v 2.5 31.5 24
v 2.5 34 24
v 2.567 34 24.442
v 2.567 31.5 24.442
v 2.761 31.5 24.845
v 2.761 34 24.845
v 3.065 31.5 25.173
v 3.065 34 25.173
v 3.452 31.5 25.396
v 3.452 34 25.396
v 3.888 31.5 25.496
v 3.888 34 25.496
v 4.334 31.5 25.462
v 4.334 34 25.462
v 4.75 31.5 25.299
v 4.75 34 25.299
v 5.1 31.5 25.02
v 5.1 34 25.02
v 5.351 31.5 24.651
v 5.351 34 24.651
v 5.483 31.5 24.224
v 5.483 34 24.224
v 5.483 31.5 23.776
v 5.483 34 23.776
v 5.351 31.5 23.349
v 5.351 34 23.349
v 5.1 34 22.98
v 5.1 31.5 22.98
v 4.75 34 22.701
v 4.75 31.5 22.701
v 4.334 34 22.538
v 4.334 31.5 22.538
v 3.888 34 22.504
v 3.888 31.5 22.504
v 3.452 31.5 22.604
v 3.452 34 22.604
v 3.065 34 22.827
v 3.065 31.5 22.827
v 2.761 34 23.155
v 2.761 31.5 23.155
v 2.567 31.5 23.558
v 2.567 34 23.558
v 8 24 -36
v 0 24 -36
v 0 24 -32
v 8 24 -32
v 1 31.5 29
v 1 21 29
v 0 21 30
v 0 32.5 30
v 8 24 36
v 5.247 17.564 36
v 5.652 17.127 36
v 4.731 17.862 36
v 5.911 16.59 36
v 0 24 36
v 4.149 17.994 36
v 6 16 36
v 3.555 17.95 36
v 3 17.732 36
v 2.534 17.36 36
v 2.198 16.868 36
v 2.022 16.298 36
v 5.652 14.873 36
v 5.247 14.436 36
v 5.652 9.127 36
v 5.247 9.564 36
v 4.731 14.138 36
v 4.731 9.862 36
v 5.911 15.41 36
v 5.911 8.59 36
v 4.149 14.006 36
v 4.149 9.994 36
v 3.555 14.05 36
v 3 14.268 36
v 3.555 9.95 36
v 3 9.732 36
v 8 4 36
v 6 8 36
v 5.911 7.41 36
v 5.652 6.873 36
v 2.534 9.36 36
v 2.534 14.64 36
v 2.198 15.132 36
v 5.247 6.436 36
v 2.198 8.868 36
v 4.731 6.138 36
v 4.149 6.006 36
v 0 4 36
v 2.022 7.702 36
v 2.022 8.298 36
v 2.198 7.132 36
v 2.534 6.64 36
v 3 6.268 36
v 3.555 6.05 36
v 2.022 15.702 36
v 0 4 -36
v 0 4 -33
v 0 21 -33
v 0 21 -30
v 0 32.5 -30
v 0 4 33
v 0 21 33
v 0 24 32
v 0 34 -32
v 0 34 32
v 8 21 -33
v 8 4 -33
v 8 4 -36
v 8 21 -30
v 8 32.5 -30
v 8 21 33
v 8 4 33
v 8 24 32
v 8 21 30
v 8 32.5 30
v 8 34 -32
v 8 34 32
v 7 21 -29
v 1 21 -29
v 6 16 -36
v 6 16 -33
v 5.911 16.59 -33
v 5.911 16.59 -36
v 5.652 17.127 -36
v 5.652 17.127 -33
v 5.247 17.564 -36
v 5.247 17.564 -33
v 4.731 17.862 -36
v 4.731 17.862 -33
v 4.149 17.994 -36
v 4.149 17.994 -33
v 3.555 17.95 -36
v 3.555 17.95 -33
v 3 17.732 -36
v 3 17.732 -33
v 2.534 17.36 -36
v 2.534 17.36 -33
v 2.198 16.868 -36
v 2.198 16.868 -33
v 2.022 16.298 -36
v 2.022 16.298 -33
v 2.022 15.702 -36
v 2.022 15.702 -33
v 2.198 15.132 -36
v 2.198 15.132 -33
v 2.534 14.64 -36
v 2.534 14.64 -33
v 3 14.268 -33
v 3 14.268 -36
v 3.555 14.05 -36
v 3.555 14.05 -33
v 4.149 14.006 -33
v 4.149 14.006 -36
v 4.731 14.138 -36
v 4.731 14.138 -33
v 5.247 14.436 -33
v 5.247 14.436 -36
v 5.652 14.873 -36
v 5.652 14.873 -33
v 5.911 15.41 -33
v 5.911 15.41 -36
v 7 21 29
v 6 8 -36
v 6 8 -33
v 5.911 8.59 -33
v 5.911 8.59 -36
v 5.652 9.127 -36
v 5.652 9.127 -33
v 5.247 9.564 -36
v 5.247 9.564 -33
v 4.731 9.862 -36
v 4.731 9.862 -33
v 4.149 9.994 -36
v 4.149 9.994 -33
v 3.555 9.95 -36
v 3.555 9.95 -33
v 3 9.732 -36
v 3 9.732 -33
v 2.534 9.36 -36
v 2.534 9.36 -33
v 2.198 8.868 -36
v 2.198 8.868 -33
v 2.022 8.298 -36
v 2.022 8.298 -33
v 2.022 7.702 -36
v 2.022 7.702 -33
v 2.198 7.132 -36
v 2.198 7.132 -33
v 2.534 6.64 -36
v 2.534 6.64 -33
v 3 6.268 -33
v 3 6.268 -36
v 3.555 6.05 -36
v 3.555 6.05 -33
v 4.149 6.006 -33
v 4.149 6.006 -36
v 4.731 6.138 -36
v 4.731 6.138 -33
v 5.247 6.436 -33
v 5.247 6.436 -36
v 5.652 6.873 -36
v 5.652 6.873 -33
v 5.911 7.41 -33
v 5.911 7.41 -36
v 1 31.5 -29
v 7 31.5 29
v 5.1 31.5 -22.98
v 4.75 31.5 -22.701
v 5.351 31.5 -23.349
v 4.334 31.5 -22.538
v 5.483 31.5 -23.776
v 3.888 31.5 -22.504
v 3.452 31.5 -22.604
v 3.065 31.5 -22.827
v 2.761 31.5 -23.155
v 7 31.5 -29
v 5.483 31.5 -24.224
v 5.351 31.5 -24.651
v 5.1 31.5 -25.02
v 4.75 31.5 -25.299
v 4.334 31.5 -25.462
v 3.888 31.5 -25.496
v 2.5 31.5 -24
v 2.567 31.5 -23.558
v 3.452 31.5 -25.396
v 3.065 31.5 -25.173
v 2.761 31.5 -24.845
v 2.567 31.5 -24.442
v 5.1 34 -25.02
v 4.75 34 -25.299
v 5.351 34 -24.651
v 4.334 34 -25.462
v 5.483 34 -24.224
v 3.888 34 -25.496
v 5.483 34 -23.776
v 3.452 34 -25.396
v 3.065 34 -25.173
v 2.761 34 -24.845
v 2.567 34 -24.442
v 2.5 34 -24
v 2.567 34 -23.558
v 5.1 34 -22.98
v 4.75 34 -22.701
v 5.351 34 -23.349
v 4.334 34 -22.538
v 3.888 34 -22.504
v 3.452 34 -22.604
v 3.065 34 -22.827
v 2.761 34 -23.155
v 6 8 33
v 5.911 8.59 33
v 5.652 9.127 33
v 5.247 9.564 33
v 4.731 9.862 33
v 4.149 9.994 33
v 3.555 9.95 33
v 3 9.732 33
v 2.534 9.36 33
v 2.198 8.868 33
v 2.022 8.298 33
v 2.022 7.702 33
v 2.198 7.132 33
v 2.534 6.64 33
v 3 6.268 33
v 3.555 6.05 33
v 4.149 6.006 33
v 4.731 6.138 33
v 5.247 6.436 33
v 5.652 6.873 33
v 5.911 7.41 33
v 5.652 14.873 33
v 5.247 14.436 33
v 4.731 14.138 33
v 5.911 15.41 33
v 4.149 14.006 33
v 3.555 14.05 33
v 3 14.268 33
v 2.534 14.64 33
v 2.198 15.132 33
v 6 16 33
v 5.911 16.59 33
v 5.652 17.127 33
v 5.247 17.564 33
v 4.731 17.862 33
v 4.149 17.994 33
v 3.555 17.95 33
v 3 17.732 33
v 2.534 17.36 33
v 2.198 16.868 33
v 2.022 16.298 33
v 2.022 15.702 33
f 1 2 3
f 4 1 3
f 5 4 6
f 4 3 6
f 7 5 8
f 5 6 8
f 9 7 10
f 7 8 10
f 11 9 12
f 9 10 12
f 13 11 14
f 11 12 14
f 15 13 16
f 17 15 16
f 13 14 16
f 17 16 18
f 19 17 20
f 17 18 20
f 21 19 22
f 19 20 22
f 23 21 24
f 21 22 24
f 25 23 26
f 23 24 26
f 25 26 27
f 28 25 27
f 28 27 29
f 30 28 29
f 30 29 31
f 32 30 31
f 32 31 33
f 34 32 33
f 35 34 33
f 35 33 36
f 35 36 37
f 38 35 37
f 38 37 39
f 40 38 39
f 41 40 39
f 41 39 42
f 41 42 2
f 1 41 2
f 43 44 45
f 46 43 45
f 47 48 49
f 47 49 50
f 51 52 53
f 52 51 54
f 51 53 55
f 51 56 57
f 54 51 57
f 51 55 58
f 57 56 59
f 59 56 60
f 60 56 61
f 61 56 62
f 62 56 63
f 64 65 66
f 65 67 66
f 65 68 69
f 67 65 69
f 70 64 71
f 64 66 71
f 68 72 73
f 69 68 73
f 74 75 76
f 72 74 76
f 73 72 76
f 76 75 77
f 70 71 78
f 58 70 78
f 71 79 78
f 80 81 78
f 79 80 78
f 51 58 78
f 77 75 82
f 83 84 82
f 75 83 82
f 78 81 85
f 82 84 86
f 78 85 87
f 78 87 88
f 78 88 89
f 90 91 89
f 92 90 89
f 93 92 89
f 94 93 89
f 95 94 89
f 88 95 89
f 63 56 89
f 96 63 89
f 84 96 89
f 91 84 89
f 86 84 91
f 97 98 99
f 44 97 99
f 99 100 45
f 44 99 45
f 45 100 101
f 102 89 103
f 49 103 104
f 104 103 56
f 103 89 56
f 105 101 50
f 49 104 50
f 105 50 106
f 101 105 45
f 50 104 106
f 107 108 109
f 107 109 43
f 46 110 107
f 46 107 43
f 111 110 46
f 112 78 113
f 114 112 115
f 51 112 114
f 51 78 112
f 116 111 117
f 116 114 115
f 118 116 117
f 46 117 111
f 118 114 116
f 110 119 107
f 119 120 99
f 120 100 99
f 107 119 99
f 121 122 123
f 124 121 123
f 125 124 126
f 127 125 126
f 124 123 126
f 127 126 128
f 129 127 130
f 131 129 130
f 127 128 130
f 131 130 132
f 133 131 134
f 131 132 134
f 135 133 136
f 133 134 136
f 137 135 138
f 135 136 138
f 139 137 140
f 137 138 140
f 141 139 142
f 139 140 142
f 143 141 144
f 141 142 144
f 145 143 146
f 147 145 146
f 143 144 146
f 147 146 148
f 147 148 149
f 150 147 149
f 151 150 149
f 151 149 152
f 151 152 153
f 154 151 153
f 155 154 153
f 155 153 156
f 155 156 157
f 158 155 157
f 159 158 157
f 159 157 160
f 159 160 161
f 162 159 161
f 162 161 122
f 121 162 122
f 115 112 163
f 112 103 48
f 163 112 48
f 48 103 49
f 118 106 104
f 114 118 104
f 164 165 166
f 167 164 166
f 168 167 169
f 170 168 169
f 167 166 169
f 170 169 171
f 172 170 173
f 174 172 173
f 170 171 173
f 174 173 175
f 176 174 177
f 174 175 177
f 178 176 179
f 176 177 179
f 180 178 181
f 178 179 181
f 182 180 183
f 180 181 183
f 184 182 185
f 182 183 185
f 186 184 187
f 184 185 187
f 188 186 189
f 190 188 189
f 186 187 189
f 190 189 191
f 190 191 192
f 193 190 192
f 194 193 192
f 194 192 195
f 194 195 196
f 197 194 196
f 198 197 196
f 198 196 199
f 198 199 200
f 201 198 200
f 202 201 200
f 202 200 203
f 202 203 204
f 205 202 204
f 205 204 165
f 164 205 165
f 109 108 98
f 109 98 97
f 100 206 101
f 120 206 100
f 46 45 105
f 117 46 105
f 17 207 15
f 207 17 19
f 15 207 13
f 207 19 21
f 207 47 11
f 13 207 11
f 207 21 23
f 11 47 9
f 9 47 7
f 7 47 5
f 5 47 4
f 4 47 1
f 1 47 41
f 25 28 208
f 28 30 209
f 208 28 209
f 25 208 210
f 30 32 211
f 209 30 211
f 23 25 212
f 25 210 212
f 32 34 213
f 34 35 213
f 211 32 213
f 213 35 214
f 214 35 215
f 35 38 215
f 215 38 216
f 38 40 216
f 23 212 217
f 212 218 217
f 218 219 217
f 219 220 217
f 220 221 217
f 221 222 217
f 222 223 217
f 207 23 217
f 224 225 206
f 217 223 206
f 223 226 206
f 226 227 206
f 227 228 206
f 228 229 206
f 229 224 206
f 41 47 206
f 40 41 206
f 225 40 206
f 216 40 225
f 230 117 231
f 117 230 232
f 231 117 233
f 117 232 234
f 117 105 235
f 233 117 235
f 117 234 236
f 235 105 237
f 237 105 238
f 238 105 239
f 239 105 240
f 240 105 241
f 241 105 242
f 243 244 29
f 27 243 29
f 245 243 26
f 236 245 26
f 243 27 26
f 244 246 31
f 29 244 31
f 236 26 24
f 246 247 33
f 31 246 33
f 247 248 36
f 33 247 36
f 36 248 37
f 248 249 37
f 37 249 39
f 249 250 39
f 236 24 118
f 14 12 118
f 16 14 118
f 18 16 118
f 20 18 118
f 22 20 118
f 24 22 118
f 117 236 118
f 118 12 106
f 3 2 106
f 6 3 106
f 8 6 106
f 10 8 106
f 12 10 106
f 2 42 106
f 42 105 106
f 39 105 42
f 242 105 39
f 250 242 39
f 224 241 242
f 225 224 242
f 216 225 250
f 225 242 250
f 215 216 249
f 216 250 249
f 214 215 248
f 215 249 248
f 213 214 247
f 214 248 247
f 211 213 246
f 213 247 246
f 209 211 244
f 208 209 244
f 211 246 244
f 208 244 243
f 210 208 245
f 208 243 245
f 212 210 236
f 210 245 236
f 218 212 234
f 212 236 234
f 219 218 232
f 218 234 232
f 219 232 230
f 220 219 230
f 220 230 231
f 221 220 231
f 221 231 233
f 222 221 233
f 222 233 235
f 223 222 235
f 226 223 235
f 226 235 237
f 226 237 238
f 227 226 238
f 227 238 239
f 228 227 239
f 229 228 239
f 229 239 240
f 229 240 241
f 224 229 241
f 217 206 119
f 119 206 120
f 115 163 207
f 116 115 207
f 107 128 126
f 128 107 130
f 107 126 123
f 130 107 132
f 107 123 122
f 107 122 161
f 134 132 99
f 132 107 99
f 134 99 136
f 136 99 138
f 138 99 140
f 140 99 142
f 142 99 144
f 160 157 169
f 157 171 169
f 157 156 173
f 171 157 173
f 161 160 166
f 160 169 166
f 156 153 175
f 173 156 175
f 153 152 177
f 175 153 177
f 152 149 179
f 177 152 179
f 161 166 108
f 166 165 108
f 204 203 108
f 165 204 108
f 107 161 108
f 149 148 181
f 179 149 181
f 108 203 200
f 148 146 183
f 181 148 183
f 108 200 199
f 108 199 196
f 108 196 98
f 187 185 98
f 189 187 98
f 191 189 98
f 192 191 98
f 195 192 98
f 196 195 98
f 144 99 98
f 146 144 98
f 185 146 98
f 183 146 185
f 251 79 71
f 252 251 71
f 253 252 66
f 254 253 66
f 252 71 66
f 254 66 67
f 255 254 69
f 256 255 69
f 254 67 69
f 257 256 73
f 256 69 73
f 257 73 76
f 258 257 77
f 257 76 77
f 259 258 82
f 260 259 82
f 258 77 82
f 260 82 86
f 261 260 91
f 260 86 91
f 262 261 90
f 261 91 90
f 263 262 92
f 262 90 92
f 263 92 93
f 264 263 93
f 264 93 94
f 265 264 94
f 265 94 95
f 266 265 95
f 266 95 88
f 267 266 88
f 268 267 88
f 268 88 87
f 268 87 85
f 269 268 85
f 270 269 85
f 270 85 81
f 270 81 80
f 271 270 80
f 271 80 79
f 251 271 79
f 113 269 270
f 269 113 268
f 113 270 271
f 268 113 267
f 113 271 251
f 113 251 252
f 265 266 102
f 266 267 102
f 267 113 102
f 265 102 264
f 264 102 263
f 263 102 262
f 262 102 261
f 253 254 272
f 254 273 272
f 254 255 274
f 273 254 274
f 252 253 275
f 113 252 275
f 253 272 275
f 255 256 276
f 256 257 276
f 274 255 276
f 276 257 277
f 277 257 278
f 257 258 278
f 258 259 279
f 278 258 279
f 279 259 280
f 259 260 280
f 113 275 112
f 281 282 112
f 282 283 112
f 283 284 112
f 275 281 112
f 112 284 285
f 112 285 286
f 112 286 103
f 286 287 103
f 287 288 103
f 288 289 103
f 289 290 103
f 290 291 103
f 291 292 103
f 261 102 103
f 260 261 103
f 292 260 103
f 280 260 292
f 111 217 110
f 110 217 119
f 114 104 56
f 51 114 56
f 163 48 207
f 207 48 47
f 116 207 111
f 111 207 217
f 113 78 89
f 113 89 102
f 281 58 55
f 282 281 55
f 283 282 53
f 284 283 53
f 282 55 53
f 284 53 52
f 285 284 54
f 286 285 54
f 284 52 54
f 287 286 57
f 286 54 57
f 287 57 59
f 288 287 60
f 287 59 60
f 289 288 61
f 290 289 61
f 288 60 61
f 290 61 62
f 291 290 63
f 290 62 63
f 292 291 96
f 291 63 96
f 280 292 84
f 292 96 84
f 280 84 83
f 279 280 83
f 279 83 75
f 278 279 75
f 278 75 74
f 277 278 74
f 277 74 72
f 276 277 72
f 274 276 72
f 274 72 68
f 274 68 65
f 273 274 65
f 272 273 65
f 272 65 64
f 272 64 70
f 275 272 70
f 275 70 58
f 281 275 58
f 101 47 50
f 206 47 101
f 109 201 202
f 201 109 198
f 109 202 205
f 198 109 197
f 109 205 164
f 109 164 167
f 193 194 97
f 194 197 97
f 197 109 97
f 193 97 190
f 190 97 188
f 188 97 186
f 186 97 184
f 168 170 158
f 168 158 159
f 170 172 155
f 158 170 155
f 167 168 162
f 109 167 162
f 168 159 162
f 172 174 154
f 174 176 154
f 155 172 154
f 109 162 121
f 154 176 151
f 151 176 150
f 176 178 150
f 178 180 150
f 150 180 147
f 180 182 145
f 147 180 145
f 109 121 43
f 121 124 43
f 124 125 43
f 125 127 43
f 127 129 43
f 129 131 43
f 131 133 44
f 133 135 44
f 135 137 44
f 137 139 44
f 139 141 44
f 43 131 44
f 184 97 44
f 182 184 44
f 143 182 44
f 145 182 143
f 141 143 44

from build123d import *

# Parameters (mm, degrees)
F1_DEPTH = 8
F2_W     = 6.02
F2_H     = 5
F3_DEPTH = 72
F4_R     = 1.5
F5_DEPTH = 25
F6_R     = 2
F7_DEPTH = 72
F8_SIZE  = 1


with BuildPart() as f1:
    # F0 (on Right) → F1 (new body)
    with BuildSketch(Plane.YZ):
        Polygon((24, 36), (4, 36), (4, 33), (21, 33), (21, 29), (31.5, 29), (31.5, -29), (21, -29), (21, -33), (4, -33), (4, -36), (24, -36), (24, -32), (34, -32), (34, -15.6872682273), (34, 32), (24, 32), align=None)
    extrude(amount=F1_DEPTH)

    # F2 (on face) → F3 (cut)
    with BuildSketch(Plane.XY.offset(36)):
        with Locations((3.01, 1.5)):
            Rectangle(F2_W, F2_H)
    extrude(amount=-F3_DEPTH, mode=Mode.SUBTRACT)

    # F4 (on face) → F5 (cut)
    with BuildSketch(Plane(origin=(0, 34, 0), x_dir=(-1, 0, 0), z_dir=(0, 1, 0))):
        with Locations((-4, 24)):
            Circle(F4_R)
        with Locations((-4, -24)):
            Circle(F4_R)
    extrude(amount=-F5_DEPTH, mode=Mode.SUBTRACT)

    # F6 (on face) → F7 (cut)
    with BuildSketch(Plane.XY.offset(36)):
        with Locations((4, 16)):
            Circle(F6_R)
        with Locations((4, 8)):
            Circle(F6_R)
    extrude(amount=-F7_DEPTH, mode=Mode.SUBTRACT)

    # F8
    f8_edges = [f1.edges().sort_by_distance(p)[0] for p in [
        (8, 31.5, 0),
        (0, 31.5, 0),
        (8, 26.25, 29),
        (0, 26.25, 29),
        (8, 26.25, -29),
        (0, 26.25, -29),
    ]]
    chamfer(f8_edges, length=F8_SIZE)


solid = f1.part
